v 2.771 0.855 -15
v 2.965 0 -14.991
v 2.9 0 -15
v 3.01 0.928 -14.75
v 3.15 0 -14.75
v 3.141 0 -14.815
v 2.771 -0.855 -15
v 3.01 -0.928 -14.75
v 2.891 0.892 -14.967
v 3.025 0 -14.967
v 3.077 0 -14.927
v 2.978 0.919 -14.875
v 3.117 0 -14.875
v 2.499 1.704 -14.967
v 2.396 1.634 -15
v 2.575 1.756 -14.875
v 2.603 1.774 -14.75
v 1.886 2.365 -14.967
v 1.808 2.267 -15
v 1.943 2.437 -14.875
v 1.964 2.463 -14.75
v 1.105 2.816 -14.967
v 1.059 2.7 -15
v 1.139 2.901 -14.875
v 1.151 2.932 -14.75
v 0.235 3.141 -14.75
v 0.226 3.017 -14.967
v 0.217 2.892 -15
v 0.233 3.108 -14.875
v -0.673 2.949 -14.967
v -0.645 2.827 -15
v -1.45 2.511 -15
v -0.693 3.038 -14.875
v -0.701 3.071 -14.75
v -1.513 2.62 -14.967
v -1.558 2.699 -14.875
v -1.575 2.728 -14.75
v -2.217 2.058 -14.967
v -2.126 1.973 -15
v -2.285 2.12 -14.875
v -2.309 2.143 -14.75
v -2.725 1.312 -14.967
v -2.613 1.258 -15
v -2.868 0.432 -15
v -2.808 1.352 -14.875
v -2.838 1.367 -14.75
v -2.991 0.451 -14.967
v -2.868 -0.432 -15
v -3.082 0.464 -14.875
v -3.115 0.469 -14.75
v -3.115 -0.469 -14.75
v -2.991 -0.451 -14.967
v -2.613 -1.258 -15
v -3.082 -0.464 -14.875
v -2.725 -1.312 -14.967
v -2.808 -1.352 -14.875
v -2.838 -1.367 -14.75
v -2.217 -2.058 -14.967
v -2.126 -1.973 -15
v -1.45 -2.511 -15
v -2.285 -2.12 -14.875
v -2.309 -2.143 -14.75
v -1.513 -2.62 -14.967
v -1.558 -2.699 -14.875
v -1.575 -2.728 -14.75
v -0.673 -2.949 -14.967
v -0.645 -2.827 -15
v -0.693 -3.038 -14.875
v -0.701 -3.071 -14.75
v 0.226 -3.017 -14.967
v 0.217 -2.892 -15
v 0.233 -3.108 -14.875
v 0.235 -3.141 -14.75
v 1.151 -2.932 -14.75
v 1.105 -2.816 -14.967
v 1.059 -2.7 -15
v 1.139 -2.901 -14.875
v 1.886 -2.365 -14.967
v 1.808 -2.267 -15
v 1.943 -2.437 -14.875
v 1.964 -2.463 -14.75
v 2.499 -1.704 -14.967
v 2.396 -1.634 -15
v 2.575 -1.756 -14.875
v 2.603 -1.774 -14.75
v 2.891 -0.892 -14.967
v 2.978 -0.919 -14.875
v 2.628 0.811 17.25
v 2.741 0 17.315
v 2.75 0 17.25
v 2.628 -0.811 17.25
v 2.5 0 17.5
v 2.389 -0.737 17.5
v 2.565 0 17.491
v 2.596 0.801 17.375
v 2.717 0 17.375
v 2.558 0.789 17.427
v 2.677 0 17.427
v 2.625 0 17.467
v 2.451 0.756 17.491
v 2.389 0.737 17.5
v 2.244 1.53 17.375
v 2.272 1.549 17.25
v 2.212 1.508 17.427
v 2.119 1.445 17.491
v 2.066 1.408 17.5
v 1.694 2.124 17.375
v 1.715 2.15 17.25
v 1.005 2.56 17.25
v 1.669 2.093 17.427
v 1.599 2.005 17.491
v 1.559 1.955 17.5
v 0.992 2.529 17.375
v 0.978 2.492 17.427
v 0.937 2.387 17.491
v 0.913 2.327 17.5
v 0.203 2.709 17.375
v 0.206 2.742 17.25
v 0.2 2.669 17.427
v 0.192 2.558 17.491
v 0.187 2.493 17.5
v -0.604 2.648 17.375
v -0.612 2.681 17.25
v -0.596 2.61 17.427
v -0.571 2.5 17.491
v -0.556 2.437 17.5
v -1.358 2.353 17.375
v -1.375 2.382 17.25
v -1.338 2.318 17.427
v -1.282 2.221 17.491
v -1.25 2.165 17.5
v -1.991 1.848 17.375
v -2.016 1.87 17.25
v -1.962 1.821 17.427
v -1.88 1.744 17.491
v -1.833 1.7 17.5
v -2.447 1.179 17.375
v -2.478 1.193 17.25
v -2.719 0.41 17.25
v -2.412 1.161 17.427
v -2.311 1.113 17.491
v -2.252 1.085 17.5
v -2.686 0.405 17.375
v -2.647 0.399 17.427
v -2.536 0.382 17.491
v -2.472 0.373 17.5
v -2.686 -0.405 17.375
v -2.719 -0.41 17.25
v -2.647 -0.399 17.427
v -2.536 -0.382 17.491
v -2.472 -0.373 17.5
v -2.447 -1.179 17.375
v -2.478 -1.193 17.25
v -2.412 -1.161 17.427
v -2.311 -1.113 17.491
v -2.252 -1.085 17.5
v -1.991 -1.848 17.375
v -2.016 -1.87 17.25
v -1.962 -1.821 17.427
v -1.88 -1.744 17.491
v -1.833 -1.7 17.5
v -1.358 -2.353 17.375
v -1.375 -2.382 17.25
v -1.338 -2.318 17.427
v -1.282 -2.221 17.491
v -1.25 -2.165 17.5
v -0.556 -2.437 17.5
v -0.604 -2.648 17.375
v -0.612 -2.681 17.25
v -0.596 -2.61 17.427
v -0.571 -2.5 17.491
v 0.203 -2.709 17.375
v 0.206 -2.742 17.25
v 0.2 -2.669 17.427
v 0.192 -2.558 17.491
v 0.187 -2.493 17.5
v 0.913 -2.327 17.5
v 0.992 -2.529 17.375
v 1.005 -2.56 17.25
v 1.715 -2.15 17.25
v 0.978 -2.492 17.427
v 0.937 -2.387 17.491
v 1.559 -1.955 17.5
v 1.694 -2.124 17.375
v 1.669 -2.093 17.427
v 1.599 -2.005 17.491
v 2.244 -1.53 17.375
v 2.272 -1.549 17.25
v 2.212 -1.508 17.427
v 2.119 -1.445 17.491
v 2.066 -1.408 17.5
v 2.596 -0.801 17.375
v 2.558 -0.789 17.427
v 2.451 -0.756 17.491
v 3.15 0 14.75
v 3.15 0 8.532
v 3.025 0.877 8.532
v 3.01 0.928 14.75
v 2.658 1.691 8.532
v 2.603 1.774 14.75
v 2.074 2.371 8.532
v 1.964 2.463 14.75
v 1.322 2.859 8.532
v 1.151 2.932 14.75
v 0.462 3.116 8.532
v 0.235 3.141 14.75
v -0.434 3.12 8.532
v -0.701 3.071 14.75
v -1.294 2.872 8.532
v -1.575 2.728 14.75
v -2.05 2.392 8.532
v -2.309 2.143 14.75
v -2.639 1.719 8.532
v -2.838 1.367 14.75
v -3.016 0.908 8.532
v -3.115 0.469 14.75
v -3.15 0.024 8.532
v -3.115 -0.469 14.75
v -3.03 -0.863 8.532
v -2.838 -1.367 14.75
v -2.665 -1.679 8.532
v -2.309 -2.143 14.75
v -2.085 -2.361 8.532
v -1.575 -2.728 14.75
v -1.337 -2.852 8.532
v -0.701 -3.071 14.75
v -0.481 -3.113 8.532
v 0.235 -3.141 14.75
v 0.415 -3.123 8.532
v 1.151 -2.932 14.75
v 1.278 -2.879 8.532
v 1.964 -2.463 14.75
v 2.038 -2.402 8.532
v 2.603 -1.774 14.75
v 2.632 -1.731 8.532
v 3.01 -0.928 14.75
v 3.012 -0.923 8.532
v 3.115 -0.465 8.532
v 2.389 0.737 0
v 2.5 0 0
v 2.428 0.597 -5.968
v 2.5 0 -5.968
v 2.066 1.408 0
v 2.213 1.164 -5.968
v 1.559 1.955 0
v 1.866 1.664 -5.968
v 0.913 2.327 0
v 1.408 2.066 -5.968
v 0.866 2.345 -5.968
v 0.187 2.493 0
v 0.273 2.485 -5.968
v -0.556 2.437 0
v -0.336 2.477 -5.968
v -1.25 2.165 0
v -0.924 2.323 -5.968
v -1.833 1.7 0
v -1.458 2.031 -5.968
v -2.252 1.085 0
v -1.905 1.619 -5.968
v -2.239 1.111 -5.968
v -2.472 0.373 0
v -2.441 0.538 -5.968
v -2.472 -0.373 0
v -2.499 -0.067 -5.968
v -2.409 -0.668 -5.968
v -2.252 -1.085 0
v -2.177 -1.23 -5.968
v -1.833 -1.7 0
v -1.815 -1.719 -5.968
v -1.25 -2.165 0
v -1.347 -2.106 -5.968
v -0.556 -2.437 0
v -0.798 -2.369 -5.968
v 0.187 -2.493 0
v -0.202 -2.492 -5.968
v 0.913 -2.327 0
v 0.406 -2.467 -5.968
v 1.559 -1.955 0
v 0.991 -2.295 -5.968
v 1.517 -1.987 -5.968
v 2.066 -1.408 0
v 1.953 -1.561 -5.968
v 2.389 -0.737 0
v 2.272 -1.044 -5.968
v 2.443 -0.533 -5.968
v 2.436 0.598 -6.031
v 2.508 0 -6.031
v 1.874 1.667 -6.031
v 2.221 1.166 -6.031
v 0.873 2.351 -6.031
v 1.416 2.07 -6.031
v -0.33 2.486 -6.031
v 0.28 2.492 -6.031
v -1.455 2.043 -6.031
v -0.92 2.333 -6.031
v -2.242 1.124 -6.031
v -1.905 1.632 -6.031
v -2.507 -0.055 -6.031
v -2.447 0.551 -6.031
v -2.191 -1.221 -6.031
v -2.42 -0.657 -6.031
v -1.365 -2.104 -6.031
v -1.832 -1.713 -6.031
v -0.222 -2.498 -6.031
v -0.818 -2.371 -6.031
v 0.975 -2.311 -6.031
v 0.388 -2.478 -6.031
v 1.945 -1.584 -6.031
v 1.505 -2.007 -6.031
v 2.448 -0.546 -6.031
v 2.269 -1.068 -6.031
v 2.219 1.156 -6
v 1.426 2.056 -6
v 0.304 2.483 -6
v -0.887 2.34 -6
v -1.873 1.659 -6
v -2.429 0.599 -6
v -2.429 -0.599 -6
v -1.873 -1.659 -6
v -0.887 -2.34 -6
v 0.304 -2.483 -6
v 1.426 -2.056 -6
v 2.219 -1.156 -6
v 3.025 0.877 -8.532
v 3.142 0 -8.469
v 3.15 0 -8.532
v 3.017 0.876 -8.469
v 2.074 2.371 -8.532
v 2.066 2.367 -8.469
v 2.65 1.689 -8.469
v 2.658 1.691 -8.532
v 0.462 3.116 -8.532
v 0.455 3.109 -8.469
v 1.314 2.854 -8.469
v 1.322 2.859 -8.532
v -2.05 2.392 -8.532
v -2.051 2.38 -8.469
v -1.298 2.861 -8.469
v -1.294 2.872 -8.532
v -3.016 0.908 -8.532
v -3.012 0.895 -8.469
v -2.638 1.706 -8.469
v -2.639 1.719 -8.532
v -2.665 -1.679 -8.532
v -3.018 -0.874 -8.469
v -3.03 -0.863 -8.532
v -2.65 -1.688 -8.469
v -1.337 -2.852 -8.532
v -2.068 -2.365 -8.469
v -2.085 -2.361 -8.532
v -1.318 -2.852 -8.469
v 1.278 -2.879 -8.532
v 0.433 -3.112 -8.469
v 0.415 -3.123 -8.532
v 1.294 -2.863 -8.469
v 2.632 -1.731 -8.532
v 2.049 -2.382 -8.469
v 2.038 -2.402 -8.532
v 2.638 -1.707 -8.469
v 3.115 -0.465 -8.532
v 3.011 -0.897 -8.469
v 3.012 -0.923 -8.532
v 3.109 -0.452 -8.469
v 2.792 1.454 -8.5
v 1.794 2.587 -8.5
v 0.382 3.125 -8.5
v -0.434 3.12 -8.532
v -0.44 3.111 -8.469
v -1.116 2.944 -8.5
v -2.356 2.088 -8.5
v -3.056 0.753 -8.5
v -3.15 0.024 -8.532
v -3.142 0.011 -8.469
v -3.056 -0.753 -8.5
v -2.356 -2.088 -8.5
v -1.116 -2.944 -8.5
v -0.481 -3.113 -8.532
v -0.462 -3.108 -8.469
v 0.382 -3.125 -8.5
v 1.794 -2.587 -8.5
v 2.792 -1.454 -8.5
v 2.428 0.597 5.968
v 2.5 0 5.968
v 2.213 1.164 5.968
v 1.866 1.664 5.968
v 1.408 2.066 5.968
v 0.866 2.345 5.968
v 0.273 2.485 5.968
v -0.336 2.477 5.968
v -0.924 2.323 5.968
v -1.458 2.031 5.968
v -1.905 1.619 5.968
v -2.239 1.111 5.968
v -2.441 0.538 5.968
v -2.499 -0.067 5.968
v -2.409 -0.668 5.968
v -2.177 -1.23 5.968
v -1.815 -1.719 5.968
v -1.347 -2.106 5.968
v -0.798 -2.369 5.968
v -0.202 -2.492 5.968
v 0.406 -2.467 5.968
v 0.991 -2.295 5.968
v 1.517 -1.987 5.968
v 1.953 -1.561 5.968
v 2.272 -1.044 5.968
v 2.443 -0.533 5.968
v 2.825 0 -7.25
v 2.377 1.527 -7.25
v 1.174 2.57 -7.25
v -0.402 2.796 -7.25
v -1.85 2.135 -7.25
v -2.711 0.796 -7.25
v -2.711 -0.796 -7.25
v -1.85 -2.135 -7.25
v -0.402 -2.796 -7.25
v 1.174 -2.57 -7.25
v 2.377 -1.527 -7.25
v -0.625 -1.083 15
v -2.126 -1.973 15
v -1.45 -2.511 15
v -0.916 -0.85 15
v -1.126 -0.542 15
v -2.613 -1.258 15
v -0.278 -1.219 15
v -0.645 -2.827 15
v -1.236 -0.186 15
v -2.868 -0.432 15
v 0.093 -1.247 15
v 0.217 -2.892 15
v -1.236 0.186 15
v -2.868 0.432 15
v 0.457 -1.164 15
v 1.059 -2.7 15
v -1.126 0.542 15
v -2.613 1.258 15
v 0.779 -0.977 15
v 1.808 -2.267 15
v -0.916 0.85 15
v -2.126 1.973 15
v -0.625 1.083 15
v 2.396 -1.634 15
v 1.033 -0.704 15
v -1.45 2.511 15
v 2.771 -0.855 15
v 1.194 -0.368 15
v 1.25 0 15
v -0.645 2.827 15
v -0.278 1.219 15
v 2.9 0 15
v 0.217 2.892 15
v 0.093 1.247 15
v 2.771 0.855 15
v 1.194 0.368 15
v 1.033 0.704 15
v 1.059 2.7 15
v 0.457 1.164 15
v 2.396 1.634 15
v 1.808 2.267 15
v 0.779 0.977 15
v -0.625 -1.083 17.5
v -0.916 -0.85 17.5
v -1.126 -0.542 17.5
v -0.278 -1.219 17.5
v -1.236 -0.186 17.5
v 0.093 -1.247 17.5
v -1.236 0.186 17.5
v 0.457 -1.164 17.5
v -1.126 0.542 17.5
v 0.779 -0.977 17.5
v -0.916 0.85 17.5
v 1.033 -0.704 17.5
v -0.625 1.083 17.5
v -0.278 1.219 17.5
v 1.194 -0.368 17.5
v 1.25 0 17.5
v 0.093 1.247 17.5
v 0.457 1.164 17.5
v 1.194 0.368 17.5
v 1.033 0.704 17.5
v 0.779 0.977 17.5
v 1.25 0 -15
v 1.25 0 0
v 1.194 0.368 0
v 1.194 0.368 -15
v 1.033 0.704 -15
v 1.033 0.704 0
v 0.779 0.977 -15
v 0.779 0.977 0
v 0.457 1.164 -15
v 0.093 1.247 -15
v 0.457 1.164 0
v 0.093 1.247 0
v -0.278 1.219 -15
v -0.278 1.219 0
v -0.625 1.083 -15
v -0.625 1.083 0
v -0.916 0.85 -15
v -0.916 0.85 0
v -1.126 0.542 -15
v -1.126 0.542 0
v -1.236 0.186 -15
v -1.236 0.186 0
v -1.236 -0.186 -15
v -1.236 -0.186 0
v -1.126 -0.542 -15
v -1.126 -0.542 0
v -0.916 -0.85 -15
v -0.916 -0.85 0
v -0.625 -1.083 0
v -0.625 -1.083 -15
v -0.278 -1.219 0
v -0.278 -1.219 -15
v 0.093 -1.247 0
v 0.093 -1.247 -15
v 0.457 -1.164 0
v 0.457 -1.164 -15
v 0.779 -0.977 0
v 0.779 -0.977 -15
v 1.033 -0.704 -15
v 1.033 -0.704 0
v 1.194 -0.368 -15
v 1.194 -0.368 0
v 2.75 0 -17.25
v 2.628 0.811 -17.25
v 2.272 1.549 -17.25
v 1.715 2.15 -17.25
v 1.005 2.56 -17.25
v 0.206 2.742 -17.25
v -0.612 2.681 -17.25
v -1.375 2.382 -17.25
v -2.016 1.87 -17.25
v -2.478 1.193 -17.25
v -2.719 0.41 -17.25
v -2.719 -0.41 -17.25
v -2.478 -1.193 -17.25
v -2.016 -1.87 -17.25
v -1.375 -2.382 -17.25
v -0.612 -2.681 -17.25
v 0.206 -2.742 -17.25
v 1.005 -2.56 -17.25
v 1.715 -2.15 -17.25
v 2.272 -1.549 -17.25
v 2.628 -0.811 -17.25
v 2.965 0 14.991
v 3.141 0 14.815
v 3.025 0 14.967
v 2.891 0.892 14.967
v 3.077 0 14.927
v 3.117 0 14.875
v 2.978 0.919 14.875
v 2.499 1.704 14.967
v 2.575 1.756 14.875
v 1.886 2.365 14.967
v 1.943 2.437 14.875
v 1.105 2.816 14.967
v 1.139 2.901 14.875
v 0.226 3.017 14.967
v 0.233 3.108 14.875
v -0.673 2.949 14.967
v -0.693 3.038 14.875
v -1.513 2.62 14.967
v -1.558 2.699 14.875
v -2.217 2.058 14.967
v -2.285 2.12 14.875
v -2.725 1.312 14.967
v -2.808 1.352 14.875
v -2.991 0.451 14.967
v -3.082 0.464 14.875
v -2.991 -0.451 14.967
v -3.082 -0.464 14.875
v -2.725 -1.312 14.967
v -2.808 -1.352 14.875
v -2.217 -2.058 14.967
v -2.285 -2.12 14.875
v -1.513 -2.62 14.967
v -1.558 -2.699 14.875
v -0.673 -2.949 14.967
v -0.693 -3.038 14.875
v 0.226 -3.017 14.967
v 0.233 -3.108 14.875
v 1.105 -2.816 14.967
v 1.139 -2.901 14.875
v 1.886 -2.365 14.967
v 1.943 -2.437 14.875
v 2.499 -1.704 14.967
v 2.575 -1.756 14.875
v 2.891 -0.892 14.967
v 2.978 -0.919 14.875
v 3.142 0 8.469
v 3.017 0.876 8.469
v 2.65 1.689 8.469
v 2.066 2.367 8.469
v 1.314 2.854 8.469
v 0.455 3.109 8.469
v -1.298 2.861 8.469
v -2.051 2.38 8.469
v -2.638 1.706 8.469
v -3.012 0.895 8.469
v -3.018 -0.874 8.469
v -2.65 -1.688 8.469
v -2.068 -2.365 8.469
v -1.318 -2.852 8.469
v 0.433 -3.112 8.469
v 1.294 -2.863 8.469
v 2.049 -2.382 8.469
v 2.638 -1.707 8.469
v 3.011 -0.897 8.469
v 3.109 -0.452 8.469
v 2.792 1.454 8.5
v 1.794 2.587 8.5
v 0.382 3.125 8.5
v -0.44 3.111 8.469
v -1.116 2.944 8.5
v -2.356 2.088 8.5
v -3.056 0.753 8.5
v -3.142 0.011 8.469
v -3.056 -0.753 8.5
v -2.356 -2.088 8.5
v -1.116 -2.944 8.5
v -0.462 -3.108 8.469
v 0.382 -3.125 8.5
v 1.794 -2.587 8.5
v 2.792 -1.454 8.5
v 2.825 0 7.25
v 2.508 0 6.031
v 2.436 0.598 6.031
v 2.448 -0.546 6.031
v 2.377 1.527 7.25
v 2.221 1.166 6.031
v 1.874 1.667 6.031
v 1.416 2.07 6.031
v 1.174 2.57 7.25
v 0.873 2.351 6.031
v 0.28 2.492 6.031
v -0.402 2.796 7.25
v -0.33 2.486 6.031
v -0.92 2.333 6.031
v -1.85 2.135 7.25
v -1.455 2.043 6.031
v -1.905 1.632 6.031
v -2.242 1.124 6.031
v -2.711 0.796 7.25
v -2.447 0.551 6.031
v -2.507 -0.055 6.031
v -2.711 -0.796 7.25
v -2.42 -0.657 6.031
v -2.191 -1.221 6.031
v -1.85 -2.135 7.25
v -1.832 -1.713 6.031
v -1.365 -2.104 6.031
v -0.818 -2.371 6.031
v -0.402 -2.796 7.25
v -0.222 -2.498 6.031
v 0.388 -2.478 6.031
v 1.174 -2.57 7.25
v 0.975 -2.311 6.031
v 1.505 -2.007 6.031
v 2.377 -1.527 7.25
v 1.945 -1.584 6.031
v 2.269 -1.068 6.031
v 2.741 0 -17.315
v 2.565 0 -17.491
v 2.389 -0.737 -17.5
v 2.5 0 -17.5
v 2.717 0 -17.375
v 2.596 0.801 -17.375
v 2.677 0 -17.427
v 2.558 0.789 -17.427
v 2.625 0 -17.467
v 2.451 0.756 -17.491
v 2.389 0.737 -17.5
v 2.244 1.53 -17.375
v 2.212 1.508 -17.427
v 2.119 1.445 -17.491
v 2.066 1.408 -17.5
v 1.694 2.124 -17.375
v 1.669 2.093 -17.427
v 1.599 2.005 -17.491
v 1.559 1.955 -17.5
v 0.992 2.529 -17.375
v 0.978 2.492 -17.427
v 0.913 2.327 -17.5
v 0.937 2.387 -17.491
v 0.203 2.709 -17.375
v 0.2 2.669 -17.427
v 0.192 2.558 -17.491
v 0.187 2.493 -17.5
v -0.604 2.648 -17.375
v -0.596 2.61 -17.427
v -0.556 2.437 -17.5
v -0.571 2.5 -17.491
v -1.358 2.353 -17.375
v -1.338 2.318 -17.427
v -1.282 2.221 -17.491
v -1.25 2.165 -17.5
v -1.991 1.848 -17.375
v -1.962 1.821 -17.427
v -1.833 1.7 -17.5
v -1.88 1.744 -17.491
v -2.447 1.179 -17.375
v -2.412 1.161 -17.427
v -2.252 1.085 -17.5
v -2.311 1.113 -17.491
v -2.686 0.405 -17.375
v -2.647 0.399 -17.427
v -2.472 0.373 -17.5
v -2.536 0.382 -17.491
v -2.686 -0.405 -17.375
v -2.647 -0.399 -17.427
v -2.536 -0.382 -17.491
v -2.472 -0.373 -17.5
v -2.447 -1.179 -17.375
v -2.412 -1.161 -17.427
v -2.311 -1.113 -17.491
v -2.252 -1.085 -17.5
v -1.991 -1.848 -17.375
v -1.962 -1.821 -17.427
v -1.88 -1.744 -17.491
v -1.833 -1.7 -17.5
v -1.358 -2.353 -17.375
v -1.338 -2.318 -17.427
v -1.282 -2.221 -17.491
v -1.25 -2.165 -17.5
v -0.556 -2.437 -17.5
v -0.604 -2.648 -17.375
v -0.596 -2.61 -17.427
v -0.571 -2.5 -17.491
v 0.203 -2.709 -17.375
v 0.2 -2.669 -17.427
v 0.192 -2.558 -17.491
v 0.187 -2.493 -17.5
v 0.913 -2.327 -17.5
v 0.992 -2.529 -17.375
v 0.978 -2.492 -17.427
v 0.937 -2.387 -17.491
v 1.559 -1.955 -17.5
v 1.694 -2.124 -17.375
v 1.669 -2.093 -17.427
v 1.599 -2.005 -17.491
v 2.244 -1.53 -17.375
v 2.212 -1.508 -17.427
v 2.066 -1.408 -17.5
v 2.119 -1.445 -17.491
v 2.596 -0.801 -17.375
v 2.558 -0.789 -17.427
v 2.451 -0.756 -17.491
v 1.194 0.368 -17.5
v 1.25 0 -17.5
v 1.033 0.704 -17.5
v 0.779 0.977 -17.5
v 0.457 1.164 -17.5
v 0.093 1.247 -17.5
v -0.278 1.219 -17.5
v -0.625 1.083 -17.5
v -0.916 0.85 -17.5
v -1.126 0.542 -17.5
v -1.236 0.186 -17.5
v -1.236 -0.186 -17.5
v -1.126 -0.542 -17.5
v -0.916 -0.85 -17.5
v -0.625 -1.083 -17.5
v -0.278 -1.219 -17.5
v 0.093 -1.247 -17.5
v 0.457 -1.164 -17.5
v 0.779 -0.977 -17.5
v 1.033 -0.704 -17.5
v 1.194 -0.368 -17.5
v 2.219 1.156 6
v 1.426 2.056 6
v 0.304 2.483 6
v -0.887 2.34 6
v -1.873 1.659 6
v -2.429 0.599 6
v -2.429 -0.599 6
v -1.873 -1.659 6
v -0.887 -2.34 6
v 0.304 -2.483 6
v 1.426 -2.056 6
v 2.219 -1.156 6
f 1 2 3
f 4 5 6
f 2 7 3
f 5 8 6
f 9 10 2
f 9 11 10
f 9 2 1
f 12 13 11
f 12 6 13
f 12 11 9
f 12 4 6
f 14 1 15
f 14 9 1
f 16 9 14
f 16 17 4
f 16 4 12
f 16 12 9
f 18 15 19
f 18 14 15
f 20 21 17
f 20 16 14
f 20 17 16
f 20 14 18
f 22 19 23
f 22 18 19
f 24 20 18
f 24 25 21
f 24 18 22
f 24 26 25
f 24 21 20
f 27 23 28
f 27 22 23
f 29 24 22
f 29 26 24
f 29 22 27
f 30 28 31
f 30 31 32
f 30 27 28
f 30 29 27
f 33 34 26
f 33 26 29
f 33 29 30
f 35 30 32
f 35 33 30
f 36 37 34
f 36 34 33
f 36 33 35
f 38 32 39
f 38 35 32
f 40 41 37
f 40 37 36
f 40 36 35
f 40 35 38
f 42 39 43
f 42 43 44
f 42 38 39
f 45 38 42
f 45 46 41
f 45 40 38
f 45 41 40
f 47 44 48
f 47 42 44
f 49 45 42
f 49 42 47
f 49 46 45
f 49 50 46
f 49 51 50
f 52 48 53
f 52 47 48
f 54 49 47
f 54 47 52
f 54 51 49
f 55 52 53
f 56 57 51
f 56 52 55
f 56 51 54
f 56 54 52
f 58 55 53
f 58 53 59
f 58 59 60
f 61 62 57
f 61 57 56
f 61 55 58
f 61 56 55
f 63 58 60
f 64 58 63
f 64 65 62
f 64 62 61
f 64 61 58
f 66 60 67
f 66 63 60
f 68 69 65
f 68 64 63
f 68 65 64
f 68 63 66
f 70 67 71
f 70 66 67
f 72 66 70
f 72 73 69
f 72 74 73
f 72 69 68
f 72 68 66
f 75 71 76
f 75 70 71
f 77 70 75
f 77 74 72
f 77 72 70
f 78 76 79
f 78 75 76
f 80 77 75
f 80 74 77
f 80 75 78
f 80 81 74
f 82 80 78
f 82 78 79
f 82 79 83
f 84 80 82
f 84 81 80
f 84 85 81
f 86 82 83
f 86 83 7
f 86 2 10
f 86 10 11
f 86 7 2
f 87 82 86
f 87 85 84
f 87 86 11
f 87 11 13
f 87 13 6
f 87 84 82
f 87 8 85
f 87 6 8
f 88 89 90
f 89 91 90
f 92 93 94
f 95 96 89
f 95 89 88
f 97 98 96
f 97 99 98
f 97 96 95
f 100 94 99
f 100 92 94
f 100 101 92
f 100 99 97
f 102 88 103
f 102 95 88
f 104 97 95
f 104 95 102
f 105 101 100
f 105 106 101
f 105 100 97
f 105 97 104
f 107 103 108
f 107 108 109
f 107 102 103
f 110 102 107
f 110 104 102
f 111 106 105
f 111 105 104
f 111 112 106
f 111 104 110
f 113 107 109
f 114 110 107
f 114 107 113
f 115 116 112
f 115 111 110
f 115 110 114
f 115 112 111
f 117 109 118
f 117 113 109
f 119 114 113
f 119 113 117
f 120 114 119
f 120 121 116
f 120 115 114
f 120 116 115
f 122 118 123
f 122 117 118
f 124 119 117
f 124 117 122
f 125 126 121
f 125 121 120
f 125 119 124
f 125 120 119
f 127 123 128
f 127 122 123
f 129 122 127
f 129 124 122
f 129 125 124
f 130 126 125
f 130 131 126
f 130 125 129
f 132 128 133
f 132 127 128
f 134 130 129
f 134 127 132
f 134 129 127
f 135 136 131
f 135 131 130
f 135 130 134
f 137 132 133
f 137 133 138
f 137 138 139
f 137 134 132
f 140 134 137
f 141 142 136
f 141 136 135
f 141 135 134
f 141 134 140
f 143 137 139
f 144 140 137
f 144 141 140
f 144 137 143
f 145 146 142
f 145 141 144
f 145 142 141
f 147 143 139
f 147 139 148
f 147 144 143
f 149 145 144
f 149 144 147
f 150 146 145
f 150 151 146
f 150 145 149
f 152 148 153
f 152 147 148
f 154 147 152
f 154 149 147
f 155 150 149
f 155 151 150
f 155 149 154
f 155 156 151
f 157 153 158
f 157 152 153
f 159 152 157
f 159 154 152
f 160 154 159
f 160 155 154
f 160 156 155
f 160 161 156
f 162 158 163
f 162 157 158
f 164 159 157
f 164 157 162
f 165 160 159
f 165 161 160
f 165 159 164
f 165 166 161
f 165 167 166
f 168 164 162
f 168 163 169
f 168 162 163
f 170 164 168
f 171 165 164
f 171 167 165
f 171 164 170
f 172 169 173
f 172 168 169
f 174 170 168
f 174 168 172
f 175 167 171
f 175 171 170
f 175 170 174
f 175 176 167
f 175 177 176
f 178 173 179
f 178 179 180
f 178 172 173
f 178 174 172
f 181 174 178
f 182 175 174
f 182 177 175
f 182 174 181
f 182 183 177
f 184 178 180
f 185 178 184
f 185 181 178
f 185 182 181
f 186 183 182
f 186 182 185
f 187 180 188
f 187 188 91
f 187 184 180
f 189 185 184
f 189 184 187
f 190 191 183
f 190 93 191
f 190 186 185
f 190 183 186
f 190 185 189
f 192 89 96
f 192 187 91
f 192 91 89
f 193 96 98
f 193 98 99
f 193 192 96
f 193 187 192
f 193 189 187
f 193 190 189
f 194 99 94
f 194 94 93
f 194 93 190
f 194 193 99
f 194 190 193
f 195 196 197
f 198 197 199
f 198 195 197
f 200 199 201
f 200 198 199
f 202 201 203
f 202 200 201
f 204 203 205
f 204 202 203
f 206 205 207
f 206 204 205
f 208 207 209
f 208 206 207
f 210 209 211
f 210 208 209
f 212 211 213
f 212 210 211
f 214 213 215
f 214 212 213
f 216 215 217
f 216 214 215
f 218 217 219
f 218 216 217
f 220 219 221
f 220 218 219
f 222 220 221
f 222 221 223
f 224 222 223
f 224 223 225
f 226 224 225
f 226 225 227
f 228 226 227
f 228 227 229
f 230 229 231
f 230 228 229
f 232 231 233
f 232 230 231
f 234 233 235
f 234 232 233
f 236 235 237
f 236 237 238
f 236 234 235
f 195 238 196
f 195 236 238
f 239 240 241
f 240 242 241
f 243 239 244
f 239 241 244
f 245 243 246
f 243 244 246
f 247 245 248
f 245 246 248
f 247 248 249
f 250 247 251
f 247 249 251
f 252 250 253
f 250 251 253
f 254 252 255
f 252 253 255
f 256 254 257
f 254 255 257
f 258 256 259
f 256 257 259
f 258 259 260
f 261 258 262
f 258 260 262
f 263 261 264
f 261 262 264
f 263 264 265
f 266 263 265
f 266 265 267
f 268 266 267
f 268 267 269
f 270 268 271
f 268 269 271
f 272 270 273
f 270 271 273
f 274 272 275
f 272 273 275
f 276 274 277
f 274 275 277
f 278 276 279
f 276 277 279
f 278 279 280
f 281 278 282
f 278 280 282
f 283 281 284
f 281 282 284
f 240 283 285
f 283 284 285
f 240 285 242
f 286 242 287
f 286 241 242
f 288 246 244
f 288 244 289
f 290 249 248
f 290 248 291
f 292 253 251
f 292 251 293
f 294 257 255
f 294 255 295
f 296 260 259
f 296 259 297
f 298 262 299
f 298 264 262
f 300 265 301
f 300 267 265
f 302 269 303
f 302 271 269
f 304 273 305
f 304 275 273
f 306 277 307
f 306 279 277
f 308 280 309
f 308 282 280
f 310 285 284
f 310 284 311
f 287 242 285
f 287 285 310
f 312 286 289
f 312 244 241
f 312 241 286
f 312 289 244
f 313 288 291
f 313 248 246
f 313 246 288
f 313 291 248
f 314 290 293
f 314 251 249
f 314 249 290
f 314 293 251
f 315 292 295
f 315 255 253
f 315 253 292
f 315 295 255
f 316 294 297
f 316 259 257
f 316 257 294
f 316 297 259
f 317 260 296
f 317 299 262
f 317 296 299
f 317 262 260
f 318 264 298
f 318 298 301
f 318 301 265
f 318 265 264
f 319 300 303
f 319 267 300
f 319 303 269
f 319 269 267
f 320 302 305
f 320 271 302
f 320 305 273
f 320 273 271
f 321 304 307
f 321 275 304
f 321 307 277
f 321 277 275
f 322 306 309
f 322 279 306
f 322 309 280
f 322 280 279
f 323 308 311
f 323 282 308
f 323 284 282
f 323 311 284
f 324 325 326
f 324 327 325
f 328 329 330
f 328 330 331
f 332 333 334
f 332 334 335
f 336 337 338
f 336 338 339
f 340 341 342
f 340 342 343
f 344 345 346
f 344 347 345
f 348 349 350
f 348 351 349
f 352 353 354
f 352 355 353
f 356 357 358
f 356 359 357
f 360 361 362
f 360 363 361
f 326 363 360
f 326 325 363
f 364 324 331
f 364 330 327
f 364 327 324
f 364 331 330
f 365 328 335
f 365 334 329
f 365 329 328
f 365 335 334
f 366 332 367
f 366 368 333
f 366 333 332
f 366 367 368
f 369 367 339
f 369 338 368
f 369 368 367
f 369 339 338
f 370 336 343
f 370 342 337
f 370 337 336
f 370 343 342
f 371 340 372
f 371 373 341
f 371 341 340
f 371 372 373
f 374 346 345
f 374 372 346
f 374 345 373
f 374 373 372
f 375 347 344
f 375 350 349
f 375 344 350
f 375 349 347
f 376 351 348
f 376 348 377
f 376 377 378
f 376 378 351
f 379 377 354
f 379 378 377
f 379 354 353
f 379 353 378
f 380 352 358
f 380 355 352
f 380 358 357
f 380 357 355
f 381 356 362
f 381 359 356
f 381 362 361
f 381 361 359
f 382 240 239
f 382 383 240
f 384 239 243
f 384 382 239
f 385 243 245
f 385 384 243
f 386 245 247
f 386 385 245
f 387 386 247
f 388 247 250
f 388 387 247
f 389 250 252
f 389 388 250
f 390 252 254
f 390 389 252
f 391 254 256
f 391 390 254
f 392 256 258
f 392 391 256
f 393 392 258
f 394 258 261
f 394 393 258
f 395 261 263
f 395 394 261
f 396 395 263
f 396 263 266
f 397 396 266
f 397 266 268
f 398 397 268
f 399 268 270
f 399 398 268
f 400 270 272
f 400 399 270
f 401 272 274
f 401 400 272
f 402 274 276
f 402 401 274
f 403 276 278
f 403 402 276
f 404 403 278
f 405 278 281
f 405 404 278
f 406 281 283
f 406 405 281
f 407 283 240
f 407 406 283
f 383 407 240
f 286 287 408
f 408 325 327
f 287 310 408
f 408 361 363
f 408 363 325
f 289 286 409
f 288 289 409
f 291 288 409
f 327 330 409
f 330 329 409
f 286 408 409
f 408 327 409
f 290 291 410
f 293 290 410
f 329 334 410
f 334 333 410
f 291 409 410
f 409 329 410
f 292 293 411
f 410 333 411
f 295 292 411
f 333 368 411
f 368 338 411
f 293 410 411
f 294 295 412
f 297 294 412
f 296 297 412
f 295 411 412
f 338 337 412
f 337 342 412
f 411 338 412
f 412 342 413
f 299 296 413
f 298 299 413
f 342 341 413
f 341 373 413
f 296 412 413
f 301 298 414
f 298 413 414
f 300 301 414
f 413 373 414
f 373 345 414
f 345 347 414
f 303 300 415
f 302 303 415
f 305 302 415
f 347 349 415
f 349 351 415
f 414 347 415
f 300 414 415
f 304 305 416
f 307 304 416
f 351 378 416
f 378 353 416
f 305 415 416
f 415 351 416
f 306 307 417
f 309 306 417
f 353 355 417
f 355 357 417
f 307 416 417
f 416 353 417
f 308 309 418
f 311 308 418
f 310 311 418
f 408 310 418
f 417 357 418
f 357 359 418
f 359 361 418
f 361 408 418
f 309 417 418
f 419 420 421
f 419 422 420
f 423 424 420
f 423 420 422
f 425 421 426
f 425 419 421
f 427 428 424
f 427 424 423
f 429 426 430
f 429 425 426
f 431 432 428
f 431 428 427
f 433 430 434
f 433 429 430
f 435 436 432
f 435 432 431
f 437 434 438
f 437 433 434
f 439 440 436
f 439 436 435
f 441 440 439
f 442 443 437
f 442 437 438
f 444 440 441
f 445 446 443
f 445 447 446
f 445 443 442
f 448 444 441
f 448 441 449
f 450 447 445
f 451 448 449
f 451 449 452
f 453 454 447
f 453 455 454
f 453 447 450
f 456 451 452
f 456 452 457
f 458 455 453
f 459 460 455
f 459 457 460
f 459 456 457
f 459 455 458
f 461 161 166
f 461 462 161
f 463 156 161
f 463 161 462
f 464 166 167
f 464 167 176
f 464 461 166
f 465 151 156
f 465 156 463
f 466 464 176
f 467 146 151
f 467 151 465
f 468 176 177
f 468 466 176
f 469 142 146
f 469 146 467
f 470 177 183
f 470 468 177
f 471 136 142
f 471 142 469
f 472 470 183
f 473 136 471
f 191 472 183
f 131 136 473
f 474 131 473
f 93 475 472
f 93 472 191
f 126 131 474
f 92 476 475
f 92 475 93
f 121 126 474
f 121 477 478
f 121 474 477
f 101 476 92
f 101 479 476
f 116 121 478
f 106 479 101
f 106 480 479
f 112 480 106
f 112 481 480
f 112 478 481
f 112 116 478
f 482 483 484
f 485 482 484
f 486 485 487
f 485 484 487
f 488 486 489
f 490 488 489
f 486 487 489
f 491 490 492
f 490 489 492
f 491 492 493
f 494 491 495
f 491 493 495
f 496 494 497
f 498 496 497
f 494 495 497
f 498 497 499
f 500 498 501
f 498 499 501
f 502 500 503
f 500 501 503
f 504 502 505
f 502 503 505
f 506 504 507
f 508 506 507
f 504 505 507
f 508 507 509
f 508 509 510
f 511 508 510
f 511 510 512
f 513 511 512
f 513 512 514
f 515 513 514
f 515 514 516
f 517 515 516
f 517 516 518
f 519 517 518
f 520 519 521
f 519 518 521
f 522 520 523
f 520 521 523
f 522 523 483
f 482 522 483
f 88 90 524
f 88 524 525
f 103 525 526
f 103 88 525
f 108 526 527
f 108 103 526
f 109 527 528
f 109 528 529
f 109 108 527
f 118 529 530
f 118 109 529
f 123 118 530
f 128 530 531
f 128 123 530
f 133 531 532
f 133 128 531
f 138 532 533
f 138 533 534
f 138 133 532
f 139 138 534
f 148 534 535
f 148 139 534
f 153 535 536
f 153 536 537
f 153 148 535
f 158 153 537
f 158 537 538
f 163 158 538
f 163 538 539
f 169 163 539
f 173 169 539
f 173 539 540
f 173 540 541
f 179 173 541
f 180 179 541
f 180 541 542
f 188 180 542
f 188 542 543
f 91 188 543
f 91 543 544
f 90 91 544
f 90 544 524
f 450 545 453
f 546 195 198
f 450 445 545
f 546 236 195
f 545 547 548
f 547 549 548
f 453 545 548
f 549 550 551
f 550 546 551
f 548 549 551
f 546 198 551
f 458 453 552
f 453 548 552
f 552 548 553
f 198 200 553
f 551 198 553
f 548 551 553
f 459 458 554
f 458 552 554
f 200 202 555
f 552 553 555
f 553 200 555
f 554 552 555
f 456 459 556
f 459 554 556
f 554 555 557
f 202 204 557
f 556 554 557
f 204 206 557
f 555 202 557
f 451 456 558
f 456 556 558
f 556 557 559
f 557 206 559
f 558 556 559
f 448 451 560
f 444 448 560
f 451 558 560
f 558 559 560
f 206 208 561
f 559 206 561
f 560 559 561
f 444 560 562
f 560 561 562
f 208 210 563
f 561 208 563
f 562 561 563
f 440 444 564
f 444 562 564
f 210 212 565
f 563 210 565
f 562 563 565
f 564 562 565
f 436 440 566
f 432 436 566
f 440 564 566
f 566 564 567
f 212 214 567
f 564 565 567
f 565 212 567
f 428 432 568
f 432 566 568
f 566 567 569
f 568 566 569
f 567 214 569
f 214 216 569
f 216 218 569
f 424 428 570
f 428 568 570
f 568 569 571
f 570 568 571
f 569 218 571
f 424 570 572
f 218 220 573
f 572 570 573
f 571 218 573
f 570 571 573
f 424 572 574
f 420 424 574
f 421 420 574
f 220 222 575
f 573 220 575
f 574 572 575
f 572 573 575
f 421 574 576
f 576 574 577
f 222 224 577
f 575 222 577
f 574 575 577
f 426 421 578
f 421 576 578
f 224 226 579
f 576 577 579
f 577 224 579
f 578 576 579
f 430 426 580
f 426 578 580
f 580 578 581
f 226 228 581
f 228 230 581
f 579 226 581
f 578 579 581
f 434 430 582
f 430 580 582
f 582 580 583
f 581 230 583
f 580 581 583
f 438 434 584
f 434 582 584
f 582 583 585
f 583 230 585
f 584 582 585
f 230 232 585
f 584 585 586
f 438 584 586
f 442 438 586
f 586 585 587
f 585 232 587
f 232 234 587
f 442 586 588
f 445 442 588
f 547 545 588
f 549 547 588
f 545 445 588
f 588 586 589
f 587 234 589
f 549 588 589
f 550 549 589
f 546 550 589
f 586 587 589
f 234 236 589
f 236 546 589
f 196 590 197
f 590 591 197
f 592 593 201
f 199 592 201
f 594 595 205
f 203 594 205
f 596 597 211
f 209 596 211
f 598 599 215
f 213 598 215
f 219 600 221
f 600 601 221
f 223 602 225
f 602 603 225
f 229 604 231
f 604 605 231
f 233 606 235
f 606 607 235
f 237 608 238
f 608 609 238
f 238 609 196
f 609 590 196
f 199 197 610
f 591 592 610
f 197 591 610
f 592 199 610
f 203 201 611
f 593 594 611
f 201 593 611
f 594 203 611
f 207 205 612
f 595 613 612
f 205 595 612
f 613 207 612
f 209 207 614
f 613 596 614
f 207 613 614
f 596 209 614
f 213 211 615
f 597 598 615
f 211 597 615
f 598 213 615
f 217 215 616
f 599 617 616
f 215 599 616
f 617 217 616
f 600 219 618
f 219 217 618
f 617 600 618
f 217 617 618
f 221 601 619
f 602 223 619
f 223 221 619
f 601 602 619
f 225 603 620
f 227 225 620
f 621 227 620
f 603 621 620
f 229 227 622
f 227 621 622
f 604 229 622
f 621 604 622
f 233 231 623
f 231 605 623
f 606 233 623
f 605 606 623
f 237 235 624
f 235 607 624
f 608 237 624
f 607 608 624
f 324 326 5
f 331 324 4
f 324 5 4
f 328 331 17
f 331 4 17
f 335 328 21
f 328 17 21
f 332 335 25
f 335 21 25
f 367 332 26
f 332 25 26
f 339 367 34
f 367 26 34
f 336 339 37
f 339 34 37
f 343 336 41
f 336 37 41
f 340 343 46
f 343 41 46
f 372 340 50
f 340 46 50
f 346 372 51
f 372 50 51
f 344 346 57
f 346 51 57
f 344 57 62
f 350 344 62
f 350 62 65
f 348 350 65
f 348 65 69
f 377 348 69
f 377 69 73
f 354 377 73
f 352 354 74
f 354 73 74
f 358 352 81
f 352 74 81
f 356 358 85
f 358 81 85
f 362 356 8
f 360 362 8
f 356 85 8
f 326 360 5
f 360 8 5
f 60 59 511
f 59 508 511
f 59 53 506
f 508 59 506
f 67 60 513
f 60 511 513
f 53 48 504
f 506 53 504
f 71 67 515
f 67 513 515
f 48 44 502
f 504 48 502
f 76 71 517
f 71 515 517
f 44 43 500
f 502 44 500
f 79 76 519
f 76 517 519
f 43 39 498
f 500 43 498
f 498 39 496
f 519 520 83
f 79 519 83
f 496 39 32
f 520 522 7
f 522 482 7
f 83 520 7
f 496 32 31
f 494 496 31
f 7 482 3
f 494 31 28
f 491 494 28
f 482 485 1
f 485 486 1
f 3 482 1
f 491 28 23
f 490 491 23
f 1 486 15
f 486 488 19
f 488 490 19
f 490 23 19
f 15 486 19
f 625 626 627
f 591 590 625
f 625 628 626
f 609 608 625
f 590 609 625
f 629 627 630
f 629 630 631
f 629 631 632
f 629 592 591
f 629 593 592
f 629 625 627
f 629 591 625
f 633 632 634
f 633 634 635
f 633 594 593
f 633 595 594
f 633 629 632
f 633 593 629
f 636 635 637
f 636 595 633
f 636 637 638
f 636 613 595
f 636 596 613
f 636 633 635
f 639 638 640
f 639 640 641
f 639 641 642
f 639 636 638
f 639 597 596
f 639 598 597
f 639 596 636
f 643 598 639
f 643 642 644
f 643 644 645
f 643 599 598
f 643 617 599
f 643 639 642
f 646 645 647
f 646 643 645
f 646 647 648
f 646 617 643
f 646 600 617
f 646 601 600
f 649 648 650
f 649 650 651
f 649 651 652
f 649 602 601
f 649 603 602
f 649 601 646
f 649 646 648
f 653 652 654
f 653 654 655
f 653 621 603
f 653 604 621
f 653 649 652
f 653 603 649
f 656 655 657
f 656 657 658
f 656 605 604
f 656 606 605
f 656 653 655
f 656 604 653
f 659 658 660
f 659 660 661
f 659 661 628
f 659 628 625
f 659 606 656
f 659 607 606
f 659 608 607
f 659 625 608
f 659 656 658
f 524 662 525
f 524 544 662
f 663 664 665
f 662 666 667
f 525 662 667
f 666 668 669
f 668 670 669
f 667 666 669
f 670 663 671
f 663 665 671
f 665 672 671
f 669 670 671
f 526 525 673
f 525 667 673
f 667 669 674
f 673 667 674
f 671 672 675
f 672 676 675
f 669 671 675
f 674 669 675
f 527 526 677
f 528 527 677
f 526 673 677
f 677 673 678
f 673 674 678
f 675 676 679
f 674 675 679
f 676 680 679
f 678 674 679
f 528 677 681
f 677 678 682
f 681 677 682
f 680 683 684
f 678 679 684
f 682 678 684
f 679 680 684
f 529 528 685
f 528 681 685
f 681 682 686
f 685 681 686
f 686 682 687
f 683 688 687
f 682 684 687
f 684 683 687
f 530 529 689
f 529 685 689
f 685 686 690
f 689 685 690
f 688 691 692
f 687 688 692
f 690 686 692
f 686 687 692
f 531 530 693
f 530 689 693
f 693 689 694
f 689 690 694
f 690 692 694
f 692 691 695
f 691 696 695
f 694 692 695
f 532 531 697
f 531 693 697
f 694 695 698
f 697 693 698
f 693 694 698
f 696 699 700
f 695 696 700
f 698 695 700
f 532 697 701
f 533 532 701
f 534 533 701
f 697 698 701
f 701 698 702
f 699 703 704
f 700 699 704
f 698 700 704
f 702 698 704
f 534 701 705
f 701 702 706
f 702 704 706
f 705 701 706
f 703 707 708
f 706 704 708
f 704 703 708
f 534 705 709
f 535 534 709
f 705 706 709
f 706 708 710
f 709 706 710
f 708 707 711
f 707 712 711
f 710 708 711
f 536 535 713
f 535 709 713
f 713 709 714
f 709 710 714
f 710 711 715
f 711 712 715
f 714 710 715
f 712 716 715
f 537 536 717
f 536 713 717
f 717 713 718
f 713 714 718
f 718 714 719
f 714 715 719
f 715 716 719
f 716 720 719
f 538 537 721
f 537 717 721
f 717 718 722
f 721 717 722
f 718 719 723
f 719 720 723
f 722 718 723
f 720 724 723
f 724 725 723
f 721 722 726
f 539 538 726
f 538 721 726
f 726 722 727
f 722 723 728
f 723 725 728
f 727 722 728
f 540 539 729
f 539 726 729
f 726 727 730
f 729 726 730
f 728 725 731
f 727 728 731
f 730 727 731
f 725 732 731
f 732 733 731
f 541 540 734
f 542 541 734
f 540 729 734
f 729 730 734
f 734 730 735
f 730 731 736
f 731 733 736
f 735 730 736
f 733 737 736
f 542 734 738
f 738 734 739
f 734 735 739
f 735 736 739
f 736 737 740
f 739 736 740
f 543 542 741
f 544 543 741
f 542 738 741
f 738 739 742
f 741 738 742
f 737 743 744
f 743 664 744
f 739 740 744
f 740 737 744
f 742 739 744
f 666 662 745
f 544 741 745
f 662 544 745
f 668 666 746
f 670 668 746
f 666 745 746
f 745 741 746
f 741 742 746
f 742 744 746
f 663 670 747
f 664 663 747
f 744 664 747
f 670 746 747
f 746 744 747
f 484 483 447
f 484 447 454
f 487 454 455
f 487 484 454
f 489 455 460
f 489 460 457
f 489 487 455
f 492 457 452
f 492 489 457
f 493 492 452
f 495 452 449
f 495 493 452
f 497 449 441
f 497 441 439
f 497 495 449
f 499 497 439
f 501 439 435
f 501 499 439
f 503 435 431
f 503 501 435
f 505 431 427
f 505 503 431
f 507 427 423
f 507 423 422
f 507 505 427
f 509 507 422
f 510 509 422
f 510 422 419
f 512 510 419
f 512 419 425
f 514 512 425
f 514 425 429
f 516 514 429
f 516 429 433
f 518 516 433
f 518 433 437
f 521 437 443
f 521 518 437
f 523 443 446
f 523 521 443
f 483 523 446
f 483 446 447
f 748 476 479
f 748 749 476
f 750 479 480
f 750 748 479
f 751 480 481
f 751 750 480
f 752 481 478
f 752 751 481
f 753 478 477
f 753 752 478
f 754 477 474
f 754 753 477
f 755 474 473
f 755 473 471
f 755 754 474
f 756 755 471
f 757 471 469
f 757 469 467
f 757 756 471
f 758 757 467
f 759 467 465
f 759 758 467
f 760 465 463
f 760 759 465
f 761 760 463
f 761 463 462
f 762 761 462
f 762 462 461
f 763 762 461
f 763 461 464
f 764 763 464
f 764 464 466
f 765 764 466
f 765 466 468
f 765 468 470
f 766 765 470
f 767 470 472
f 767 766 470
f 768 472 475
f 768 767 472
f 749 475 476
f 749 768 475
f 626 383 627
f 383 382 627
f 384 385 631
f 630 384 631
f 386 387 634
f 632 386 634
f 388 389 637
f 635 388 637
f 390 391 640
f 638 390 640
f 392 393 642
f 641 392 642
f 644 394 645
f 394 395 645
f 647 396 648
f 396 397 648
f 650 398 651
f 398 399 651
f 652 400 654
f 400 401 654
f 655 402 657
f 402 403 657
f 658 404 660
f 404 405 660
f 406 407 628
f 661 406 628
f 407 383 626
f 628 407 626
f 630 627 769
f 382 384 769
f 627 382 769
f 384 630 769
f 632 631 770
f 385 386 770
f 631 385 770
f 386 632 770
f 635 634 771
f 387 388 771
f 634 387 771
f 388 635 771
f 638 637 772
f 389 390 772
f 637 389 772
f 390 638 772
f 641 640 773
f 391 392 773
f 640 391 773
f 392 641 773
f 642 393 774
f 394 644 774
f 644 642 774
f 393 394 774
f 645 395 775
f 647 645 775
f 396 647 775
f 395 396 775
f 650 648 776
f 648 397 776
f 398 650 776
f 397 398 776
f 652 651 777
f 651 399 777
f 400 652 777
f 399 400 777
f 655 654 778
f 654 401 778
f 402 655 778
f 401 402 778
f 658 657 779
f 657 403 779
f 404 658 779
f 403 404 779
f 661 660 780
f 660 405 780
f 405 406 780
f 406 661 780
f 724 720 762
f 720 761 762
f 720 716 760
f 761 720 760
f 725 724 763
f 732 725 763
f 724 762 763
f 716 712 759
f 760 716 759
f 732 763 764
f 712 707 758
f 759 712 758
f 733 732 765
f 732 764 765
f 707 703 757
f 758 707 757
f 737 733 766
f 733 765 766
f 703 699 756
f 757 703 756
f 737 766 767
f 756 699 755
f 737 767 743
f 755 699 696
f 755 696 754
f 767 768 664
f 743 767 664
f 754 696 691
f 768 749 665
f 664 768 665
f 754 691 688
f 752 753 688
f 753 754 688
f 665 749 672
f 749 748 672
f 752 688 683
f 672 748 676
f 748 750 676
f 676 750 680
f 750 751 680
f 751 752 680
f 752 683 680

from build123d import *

# Parameters (mm, degrees)
F2_R     = 0.25
F4_R     = 2.75
F4_R_2   = 1.25
F5_DEPTH = 17.5
F6_R     = 0.25


with BuildPart() as f1:
    # F0 (on Front) → F1 (revolve)
    with BuildSketch(Plane.XZ):
        Polygon((3.15, 15), (1.25, 15), (1.25, 0), (2.5, 0), (2.5, 6), (3.15, 8.5), align=None)
    revolve(axis=Axis((0, 0, 7.5), (0, 0, 1)))

    # F2
    f2_edges = [f1.edges().sort_by_distance(p)[0] for p in [
        (-3.15, 0, 15),
        (-3.15, 0, 8.5),
        (-2.5, 0, 6),
    ]]
    fillet(f2_edges, radius=F2_R)

    # F3: F1 across plane


with BuildPart() as f1_1:
    add(f1.part)
    add(f1.part.mirror(Plane.XY))


with BuildPart() as f5:
    # F4 (on Top) → F5 (new body, symmetric)
    with BuildSketch(Plane.XY):
        Circle(F4_R)
        Circle(F4_R_2, mode=Mode.SUBTRACT)
    extrude(amount=F5_DEPTH, both=True)

    # F6
    f6_edges = [f5.edges().sort_by_distance(p)[0] for p in [
        (-2.75, 0, 17.5),
        (-2.75, 0, -17.5),
    ]]
    fillet(f6_edges, radius=F6_R)


solid = Compound([f1_1.part, f5.part])
